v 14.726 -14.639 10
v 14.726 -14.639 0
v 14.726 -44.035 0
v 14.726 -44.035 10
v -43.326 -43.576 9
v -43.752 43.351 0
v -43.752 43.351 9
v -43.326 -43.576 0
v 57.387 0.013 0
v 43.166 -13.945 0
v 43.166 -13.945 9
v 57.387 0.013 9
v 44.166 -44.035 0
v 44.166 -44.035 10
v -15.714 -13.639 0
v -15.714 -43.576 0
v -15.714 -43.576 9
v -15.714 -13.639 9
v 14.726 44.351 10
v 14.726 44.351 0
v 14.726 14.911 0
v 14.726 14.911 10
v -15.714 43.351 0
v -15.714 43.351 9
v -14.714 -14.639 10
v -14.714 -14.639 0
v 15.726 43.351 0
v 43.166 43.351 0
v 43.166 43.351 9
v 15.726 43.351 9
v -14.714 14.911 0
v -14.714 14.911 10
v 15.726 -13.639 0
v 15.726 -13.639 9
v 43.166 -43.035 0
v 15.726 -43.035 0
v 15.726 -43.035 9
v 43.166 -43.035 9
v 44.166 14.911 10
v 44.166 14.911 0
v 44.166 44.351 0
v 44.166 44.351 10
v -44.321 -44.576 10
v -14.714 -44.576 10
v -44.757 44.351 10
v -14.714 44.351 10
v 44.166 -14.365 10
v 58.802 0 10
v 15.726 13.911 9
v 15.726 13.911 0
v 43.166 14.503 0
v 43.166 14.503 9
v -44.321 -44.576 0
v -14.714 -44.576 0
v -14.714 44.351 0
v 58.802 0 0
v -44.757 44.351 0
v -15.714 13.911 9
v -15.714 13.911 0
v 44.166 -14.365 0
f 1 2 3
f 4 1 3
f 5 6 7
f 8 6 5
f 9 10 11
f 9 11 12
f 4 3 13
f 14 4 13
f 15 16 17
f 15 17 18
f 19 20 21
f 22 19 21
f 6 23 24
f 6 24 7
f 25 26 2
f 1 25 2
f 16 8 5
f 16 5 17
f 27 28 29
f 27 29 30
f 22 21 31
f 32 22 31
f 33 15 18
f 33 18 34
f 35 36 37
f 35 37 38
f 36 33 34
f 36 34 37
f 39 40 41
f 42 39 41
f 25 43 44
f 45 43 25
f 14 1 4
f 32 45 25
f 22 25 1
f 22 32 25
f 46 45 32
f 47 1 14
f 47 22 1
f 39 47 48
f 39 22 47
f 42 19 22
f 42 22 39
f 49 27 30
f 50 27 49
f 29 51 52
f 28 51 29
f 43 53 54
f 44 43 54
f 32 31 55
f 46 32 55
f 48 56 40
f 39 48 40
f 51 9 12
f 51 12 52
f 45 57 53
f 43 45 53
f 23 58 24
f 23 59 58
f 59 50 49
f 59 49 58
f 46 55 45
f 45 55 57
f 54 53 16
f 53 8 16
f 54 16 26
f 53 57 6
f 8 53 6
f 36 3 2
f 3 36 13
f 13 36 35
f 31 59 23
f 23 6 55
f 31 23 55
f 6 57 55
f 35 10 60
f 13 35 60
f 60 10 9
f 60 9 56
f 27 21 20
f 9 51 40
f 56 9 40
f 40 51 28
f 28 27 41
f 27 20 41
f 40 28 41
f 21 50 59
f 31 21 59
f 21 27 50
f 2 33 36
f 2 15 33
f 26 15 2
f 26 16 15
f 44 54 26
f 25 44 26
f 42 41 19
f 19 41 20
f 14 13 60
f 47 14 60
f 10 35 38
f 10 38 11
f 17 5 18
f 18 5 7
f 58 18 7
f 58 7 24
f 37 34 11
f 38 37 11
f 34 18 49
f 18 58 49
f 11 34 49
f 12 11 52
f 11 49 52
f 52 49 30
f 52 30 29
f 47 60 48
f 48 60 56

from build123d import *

# Parameters (mm, degrees)
F1_DEPTH = 10
F2_T     = -1


with BuildPart() as f1:
    # F0 (on Top) → F1 (new body)
    with BuildSketch(Plane.XY):
        Polygon((-14.713825658, 44.3513132632), (-44.7570756078, 44.3513132632), (-44.3209633231, -44.5757396519), (-14.713825658, -44.5757396519), (-14.713825658, -14.638537541), (14.726145193, -14.638537541), (14.726145193, -44.034704566), (44.1661179066, -44.034704566), (44.1661179066, -14.3647896479), (58.8016323745, 0), (44.1661179066, 14.9113414809), (44.1661179066, 44.3513132632), (14.726145193, 44.3513132632), (14.726145193, 14.9113414809), (-14.713825658, 14.9113414809), align=None)
    extrude(amount=F1_DEPTH)

    # F2
    f2_openings = [f1.faces().sort_by_distance(p)[0] for p in [
        (1.349814, 0.088253, 0),
    ]]
    offset(amount=F2_T, openings=f2_openings, kind=Kind.INTERSECTION)


solid = f1.part
